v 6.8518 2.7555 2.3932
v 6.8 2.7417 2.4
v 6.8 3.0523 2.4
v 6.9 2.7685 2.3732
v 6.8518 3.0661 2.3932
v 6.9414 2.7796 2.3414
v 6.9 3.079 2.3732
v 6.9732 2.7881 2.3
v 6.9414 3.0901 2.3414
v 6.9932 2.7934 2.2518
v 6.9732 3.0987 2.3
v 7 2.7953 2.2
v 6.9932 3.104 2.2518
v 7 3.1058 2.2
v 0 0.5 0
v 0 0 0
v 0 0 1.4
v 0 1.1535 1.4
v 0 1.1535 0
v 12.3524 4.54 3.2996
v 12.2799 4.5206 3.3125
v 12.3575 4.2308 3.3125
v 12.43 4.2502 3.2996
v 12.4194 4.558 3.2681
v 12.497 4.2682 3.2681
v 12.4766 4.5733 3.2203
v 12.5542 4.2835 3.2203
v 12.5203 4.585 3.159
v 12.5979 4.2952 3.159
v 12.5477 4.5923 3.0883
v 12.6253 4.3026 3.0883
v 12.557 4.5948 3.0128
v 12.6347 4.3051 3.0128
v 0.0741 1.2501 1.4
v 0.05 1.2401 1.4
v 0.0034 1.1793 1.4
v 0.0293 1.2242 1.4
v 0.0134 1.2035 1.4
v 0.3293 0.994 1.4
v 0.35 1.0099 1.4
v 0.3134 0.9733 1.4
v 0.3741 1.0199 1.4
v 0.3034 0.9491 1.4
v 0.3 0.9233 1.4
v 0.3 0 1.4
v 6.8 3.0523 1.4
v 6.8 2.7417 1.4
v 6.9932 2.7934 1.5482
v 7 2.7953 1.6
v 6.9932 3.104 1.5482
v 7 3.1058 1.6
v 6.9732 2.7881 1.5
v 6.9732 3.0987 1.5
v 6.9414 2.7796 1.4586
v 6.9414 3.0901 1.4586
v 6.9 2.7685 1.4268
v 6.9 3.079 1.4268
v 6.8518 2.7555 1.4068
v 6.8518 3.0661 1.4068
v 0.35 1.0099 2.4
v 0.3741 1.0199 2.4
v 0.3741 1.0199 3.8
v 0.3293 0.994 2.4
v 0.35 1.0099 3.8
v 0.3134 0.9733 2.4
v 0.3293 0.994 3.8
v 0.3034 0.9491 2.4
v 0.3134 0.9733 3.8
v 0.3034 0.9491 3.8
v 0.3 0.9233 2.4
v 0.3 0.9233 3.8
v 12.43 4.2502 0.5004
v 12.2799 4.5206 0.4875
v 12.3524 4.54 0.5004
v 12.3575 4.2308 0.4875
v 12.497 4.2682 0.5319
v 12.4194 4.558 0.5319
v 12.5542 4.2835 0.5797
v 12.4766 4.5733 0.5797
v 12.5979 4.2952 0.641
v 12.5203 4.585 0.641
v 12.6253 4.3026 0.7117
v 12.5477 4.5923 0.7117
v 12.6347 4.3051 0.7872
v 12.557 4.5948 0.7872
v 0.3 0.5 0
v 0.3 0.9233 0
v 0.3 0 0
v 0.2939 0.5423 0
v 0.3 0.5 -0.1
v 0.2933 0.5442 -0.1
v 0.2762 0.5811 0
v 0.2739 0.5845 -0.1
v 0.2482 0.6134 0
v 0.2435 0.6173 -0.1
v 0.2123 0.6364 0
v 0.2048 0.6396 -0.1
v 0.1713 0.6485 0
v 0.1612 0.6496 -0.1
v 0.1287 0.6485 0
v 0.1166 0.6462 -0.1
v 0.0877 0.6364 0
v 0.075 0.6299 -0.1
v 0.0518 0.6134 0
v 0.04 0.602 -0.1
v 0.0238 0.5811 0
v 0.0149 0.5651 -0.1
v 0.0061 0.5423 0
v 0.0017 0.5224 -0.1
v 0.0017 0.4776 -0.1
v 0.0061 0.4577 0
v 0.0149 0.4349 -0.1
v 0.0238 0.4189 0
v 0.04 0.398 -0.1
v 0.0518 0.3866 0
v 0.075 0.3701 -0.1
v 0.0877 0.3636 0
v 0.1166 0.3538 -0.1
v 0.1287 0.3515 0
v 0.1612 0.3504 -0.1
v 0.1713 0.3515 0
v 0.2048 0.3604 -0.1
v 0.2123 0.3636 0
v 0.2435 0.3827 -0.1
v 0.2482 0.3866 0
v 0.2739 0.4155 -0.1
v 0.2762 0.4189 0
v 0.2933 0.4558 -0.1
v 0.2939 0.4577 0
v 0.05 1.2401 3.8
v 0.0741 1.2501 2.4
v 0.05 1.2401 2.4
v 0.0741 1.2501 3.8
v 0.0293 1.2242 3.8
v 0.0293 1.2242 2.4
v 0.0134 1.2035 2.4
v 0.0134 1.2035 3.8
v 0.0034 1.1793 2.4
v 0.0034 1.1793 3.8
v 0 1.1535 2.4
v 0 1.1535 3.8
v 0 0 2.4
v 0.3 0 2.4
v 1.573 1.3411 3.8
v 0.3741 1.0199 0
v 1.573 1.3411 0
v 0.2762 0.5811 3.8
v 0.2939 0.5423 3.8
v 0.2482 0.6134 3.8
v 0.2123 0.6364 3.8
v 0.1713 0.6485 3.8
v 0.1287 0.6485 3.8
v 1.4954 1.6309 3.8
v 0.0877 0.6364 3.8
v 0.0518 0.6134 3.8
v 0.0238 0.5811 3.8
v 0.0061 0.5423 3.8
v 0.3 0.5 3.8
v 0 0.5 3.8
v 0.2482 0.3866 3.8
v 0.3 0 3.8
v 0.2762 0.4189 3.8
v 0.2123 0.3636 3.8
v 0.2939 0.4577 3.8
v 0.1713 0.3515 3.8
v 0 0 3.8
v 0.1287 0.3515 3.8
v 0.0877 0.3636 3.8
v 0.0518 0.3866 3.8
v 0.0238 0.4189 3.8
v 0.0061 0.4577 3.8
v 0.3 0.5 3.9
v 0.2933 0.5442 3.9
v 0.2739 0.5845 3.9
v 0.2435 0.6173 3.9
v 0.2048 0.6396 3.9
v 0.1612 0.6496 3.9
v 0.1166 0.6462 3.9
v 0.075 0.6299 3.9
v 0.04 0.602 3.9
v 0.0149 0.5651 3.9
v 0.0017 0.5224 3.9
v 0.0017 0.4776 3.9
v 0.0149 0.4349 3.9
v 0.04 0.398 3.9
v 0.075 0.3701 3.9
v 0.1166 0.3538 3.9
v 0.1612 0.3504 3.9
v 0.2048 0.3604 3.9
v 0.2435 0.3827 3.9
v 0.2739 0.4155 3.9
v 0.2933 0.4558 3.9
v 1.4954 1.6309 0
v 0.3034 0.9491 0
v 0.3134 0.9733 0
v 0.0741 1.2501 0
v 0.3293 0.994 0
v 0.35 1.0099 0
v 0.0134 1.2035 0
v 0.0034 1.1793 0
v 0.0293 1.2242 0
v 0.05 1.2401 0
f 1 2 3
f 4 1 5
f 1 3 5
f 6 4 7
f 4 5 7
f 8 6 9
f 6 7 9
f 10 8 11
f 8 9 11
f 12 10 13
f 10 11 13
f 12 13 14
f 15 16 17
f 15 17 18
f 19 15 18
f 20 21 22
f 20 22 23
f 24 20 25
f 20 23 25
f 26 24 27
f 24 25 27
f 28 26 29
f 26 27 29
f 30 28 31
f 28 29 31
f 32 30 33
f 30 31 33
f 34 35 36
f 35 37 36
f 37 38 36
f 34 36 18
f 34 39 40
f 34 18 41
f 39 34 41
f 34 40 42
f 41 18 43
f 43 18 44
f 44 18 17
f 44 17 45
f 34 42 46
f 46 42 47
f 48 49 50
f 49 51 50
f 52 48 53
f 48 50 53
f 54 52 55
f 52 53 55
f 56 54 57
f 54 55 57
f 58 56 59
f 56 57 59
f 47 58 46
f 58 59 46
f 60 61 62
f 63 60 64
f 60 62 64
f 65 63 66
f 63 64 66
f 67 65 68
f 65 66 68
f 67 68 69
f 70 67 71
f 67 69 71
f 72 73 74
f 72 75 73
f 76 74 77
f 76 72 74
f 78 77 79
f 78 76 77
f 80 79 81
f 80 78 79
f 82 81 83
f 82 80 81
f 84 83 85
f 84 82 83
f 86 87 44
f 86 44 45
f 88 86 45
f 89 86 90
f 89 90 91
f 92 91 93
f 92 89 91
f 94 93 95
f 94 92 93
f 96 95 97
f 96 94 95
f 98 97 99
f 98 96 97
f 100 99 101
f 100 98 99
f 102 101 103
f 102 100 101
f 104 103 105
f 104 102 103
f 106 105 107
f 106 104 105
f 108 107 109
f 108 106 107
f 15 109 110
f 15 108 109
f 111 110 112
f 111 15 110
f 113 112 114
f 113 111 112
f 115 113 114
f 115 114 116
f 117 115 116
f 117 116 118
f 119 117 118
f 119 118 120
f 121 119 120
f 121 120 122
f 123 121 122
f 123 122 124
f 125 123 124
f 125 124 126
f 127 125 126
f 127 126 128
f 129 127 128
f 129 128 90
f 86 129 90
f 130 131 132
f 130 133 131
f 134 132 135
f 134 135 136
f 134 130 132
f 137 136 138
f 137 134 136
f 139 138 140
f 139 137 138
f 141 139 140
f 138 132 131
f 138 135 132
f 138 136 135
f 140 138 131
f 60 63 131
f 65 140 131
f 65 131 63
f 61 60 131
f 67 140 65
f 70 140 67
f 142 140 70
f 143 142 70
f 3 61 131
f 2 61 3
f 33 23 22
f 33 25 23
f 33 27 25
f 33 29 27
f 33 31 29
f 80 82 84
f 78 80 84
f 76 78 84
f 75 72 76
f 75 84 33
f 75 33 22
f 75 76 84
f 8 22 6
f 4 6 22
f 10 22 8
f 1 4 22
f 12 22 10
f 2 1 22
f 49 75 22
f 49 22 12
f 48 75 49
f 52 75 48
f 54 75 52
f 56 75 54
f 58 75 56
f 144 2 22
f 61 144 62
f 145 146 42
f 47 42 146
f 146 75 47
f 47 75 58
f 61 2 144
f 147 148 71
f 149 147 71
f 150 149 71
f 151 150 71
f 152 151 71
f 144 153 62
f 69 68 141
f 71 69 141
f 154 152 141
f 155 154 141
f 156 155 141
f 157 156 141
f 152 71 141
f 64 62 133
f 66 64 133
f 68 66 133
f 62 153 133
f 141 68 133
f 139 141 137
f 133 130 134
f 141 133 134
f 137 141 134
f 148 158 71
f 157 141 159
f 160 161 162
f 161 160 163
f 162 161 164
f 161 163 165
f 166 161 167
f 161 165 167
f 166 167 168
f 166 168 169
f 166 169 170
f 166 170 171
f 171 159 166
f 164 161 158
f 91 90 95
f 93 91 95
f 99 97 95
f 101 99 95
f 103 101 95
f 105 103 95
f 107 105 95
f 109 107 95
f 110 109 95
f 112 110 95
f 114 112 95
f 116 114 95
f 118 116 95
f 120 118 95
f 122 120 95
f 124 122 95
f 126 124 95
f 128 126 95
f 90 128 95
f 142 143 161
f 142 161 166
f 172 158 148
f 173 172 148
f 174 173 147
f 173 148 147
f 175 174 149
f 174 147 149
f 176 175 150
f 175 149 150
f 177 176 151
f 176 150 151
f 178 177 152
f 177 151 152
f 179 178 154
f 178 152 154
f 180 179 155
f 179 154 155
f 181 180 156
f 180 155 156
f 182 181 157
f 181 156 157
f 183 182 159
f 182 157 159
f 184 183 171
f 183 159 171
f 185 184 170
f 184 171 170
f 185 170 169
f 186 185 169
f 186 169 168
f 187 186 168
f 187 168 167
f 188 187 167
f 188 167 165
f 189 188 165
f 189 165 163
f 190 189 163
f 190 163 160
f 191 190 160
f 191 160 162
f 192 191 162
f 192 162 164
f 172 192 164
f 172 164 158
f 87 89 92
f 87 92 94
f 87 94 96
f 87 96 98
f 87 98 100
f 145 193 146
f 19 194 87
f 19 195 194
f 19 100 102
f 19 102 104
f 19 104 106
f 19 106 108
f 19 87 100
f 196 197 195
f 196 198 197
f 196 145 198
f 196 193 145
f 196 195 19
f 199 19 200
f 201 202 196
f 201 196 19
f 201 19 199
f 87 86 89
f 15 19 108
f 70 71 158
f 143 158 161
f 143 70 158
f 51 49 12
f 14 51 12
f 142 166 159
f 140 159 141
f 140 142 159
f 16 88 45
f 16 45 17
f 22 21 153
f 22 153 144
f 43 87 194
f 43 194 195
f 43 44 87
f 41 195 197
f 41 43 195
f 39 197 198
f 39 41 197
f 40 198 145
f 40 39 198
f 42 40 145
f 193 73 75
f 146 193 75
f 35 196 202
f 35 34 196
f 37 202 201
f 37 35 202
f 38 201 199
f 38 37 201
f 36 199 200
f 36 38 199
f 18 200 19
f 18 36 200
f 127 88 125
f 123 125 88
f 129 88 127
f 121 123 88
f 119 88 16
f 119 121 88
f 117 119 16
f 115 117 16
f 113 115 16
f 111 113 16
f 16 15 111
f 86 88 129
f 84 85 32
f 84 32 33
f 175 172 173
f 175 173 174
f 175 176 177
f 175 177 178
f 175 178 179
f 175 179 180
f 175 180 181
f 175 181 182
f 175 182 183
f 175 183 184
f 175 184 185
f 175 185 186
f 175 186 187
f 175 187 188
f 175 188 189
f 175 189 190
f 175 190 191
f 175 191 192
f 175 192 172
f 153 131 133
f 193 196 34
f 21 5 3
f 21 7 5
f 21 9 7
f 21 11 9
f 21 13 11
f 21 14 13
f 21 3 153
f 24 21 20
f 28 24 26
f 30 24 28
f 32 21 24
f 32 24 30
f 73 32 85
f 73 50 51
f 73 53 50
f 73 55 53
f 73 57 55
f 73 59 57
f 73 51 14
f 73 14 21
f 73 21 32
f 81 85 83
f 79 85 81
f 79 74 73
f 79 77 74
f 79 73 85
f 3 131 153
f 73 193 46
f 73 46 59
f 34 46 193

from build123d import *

# Parameters (mm, degrees)
BOSS_EXTRUDE1_DEPTH      = 3.8
CHAMFER1_SIZE            = 0.5
CHAMFER1_SIZE2           = 11.451882774
SKETCH3_R                = 0.15
BOSS_EXTRUDE2_DEPTH      = 0.1
BOSS_EXTRUDE2_DEPTH_BACK = 3.9
SKETCH4_W                = 7
SKETCH4_H                = 1
CUT_EXTRUDE2_DEPTH       = 10
FILLET1_R                = 0.1
FILLET2_R                = 0.3
FILLET3_R                = 0.2


with BuildPart() as part:
    # Sketch1 → Boss-Extrude1 (new body)
    with BuildSketch(Plane.XY):
        Polygon((0, 0), (0, 1.230198096), (12.557035742, 4.594845683), (12.634681455, 4.305067935), (0.3, 1), (0.3, 0), align=None)
    extrude(amount=BOSS_EXTRUDE1_DEPTH)

    # Chamfer1
    chamfer1_edges = [part.edges().sort_by_distance(p)[0] for p in [
        (12.595858599, 4.449956809, 3.8),
        (12.595858599, 4.449956809, 0),
    ]]
    chamfer1_side = [part.faces().sort_by_distance(p)[0] for p in [
        (12.595858599, 4.449956809, 1.9),
    ]]
    chamfer(chamfer1_edges, length=CHAMFER1_SIZE, length2=CHAMFER1_SIZE2, reference=chamfer1_side[0])

    # Sketch3 → Boss-Extrude2 (add, two sides)
    with BuildSketch(Plane.XY.offset(3.8)) as boss_extrude2_sk:
        with Locations((0.15, 0.5)):
            Circle(SKETCH3_R)
    extrude(amount=BOSS_EXTRUDE2_DEPTH)
    extrude(boss_extrude2_sk.sketch, amount=-BOSS_EXTRUDE2_DEPTH_BACK)

    # Sketch4 → Cut-Extrude2 (cut)
    with BuildSketch(Plane.XZ):
        with Locations((3.5, 1.9)):
            Rectangle(SKETCH4_W, SKETCH4_H)
    extrude(amount=-CUT_EXTRUDE2_DEPTH, mode=Mode.SUBTRACT)

    # Fillet1
    fillet1_edges = [part.edges().sort_by_distance(p)[0] for p in [
        (0, 1.230198096, 3.1),
        (0.3, 1, 3.1),
        (0, 1.230198096, 0.7),
        (0.3, 1, 0.7),
    ]]
    fillet(fillet1_edges, radius=FILLET1_R)

    # Fillet2
    fillet2_edges = [part.edges().sort_by_distance(p)[0] for p in [
        (12.595858599, 4.449956809, 0.5),
        (12.595858599, 4.449956809, 3.3),
    ]]
    fillet(fillet2_edges, radius=FILLET2_R)

    # Fillet3
    fillet3_edges = [part.edges().sort_by_distance(p)[0] for p in [
        (7, 2.950551016, 2.4),
        (7, 2.950551016, 1.4),
    ]]
    fillet(fillet3_edges, radius=FILLET3_R)


solid = part.part
